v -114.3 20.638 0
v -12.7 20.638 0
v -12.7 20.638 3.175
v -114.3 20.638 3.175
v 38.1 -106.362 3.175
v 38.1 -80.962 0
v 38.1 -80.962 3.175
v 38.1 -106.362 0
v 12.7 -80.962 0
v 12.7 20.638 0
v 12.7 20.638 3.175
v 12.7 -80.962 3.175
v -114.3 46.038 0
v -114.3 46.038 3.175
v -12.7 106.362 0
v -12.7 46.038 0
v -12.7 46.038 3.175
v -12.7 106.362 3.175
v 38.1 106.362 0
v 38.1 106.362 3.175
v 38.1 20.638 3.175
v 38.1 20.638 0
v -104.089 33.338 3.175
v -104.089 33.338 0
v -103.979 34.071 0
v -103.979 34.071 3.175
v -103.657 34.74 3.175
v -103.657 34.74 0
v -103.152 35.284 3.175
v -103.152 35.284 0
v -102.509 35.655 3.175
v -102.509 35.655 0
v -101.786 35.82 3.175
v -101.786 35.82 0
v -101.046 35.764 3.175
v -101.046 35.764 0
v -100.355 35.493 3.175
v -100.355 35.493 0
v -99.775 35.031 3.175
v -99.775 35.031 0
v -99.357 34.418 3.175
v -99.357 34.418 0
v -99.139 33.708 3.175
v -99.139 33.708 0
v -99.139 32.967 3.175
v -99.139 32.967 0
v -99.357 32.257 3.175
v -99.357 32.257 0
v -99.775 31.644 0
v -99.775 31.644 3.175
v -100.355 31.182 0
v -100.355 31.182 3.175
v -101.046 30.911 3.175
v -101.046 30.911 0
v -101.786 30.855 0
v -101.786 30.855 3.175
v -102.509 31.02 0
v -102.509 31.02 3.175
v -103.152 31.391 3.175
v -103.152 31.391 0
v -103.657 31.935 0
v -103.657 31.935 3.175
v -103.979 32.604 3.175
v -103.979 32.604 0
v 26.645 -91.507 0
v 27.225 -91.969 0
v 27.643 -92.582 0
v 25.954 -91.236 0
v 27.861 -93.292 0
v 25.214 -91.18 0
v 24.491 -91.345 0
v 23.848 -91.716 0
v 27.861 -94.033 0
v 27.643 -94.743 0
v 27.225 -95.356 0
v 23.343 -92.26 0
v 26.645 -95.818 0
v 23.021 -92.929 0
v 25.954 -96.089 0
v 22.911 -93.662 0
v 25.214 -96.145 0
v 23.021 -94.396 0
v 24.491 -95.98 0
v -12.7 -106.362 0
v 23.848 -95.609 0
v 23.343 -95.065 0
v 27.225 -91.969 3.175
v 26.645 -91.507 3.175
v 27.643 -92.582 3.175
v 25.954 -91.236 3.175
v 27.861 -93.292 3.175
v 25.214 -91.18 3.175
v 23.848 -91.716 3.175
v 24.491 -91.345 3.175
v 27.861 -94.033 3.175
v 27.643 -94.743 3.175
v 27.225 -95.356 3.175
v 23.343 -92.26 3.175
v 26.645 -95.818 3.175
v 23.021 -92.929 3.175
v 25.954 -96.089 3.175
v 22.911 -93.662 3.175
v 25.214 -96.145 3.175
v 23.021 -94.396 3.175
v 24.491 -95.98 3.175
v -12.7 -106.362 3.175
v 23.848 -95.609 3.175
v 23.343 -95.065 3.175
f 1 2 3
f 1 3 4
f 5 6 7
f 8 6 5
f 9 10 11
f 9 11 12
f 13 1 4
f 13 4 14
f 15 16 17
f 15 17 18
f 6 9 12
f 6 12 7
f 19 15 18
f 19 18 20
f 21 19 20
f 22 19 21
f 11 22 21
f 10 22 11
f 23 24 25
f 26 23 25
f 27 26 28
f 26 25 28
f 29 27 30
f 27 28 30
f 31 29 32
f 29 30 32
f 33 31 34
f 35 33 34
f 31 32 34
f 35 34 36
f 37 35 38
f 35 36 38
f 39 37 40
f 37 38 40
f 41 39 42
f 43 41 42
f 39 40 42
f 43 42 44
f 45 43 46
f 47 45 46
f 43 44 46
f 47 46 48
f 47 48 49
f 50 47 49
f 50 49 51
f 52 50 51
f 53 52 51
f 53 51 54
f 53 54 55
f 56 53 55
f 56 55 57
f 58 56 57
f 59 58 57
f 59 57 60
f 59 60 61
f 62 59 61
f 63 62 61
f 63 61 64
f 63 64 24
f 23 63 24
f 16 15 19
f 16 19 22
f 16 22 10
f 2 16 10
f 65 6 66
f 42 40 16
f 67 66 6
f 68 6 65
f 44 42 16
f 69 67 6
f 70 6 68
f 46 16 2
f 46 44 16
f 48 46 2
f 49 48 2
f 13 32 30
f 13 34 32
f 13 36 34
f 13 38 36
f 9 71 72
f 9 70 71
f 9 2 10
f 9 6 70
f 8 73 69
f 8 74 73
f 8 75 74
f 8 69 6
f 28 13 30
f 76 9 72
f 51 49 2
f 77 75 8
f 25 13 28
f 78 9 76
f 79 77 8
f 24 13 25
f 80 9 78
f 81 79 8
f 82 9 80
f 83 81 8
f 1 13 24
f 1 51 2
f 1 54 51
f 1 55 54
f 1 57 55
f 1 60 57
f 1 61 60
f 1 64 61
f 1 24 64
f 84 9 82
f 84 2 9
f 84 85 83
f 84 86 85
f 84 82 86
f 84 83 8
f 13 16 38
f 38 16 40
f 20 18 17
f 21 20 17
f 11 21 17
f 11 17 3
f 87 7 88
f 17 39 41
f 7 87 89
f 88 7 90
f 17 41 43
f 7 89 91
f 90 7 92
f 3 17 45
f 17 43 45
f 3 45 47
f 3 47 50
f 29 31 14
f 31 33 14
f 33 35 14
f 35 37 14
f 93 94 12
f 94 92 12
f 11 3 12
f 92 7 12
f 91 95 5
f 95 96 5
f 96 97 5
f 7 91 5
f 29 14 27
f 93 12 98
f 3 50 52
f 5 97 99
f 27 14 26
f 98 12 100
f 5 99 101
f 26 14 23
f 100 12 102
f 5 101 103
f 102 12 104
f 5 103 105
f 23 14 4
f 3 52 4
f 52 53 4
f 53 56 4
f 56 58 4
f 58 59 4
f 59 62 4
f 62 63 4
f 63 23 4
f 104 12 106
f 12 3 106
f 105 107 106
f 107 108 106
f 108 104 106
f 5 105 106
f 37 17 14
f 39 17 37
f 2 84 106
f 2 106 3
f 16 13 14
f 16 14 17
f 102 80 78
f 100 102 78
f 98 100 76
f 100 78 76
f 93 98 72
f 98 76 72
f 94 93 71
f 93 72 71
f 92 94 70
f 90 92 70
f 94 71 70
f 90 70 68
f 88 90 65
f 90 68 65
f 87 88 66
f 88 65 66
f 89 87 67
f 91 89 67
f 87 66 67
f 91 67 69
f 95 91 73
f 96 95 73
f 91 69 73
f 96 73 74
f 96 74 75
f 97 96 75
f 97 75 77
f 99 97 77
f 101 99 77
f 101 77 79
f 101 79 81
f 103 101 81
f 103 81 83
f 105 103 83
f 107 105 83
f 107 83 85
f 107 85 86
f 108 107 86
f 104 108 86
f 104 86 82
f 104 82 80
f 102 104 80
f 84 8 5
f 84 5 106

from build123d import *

# Parameters (mm, degrees)
BOSS_EXTRUDE1_DEPTH        = 3.175
F_9_0_196_DIAMETER_HOLE1_D = 4.9784


with BuildPart() as part:
    # Sketch1 → Boss-Extrude1 (new body)
    with BuildSketch(Plane(origin=(0, 0, 0), x_dir=(0, 1, 0), z_dir=(0, 0, 1))):
        Polygon((-80.9625, -12.7), (-80.9625, -38.1), (-106.3625, -38.1), (-106.3625, 12.7), (20.6375, 12.7), (20.6375, 114.3), (46.0375, 114.3), (46.0375, 12.7), (106.3625, 12.7), (106.3625, -38.1), (20.6375, -38.1), (20.6375, -12.7), align=None)
    extrude(amount=BOSS_EXTRUDE1_DEPTH)

    # #9 (0.196) Diameter Hole1 (through all)
    with Locations(Plane.XY.offset(3.175)):
        with Locations((25.4, -93.6625), (-153.251995768, -35.15541816), (-101.6, 33.3375), (-174.461563536, 15.375329004)):
            Hole(F_9_0_196_DIAMETER_HOLE1_D / 2)


solid = part.part
